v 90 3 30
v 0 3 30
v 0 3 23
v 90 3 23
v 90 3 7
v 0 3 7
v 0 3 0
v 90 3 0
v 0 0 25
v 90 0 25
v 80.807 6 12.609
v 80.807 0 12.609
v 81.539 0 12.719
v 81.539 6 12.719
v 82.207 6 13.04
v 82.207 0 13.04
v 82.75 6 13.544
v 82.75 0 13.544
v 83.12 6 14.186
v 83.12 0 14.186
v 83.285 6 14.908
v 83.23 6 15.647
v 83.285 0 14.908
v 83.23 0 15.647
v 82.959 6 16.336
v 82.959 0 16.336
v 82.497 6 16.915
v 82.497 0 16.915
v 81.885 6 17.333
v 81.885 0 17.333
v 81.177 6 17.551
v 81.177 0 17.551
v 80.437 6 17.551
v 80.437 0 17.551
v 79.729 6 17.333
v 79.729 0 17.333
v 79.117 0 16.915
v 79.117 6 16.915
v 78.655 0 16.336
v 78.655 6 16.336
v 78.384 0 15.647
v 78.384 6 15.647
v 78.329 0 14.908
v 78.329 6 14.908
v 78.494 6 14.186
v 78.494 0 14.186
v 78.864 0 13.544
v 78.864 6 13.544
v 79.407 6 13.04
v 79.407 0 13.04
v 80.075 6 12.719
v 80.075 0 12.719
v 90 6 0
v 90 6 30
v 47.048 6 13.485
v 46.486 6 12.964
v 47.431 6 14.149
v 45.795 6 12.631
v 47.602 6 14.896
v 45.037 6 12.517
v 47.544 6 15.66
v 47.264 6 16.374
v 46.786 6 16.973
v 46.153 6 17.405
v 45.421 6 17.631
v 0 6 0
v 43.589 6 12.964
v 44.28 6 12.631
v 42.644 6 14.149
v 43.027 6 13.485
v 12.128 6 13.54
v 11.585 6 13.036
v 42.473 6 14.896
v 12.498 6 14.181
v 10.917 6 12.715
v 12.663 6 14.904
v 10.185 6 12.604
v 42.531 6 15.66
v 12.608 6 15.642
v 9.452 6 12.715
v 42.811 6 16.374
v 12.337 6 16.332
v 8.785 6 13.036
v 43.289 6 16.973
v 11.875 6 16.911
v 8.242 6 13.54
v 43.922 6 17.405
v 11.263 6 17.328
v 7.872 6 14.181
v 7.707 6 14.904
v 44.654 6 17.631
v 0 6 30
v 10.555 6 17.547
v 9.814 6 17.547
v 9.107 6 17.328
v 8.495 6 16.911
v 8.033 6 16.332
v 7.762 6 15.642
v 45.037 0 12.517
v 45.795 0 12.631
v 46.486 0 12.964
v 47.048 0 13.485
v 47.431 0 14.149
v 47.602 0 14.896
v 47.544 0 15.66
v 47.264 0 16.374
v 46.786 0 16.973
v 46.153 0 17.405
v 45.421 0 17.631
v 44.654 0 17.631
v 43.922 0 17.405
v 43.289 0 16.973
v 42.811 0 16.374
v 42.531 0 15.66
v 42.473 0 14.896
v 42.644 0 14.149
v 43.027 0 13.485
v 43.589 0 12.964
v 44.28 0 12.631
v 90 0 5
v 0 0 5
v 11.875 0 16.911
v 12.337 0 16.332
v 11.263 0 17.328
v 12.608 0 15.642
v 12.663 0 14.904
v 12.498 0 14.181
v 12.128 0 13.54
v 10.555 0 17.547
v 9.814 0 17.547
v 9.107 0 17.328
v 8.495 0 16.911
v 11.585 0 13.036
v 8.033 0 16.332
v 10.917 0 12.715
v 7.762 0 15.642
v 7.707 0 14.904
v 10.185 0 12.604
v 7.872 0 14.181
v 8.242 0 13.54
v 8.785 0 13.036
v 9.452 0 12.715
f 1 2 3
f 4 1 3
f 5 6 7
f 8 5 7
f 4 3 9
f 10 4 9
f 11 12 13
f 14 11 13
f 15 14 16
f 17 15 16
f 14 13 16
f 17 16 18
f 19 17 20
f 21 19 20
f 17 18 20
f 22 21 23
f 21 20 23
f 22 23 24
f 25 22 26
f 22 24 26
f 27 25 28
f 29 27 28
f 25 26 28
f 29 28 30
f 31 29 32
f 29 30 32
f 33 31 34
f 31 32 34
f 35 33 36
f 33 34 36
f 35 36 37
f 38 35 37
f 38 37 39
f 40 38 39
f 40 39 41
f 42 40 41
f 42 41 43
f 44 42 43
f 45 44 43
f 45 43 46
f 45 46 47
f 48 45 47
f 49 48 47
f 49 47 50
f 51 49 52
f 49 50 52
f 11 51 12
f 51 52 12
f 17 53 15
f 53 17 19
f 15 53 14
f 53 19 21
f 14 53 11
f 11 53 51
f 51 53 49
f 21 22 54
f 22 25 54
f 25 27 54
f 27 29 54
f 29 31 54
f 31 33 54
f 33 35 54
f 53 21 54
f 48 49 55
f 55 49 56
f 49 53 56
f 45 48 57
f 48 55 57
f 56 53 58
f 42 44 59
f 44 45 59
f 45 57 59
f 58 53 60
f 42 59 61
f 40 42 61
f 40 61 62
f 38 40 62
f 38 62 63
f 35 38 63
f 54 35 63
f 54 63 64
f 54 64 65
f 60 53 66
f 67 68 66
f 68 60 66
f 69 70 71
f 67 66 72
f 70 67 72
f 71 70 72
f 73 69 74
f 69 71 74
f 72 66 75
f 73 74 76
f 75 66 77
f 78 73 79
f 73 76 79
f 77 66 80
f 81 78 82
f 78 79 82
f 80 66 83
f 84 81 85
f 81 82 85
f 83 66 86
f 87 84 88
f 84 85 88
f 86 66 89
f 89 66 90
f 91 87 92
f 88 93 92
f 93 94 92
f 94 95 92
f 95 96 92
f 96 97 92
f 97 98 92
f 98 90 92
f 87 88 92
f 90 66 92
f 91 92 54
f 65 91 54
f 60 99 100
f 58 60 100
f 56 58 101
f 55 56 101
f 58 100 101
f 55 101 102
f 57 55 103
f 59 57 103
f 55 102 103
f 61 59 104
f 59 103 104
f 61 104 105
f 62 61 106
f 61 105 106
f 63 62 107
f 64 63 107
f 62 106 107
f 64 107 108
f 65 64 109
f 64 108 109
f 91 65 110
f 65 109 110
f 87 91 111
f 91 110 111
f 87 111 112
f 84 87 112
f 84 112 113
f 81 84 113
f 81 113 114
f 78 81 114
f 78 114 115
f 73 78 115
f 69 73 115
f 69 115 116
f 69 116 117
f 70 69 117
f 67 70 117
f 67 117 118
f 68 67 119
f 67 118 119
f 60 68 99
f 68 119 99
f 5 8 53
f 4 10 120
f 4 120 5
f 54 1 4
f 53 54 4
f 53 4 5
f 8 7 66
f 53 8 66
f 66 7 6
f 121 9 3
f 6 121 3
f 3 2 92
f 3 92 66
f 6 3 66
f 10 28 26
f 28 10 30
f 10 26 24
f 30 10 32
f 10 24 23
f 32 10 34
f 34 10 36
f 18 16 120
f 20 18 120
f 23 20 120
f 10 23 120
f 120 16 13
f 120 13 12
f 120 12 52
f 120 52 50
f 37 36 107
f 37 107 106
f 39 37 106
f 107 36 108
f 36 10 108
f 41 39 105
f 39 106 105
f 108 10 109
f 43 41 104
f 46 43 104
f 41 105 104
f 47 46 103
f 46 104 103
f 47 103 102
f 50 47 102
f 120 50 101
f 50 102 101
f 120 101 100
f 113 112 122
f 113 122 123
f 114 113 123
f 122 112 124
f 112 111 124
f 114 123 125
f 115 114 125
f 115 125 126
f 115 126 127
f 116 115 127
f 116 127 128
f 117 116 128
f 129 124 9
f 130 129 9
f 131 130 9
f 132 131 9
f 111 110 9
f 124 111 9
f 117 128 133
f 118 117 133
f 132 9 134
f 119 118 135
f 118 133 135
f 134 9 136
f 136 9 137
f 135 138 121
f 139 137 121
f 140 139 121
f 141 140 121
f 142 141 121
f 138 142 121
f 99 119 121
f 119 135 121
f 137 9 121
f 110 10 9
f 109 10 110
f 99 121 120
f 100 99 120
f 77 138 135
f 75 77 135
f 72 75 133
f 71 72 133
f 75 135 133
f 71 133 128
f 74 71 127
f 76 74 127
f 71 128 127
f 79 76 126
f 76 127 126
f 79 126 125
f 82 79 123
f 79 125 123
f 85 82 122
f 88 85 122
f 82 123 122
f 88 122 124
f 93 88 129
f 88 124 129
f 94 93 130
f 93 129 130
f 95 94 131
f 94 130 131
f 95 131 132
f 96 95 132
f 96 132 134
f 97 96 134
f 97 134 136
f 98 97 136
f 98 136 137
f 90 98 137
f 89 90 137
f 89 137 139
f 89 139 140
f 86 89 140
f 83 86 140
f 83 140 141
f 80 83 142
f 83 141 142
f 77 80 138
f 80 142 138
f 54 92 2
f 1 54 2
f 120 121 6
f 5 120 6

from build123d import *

# Parameters (mm, degrees)
PAD_DEPTH     = 90
SKETCH001_R   = 2.571292
SKETCH001_R_2 = 2.48503
POCKET_DEPTH  = 6


with BuildPart() as part:
    # Sketch → Pad (new body)
    with BuildSketch(Plane.YZ):
        Polygon((6, 0), (6, 30), (3, 30), (3, 23), (0, 25), (0, 5), (3, 7), (3, 0), align=None)
    extrude(amount=PAD_DEPTH)

    # Sketch001 → Pocket (cut)
    with BuildSketch(Plane(origin=(0, 0, 0), x_dir=(0, 0, -1), z_dir=(0, -1, 0))):
        with Locations((-15.088319, 45.037495)):
            Circle(SKETCH001_R)
        with Locations((-15.093687, 80.807022)):
            Circle(SKETCH001_R_2)
        with Locations((-15.089277, 10.18487)):
            Circle(SKETCH001_R_2)
    extrude(amount=-POCKET_DEPTH, mode=Mode.SUBTRACT)


solid = part.part
